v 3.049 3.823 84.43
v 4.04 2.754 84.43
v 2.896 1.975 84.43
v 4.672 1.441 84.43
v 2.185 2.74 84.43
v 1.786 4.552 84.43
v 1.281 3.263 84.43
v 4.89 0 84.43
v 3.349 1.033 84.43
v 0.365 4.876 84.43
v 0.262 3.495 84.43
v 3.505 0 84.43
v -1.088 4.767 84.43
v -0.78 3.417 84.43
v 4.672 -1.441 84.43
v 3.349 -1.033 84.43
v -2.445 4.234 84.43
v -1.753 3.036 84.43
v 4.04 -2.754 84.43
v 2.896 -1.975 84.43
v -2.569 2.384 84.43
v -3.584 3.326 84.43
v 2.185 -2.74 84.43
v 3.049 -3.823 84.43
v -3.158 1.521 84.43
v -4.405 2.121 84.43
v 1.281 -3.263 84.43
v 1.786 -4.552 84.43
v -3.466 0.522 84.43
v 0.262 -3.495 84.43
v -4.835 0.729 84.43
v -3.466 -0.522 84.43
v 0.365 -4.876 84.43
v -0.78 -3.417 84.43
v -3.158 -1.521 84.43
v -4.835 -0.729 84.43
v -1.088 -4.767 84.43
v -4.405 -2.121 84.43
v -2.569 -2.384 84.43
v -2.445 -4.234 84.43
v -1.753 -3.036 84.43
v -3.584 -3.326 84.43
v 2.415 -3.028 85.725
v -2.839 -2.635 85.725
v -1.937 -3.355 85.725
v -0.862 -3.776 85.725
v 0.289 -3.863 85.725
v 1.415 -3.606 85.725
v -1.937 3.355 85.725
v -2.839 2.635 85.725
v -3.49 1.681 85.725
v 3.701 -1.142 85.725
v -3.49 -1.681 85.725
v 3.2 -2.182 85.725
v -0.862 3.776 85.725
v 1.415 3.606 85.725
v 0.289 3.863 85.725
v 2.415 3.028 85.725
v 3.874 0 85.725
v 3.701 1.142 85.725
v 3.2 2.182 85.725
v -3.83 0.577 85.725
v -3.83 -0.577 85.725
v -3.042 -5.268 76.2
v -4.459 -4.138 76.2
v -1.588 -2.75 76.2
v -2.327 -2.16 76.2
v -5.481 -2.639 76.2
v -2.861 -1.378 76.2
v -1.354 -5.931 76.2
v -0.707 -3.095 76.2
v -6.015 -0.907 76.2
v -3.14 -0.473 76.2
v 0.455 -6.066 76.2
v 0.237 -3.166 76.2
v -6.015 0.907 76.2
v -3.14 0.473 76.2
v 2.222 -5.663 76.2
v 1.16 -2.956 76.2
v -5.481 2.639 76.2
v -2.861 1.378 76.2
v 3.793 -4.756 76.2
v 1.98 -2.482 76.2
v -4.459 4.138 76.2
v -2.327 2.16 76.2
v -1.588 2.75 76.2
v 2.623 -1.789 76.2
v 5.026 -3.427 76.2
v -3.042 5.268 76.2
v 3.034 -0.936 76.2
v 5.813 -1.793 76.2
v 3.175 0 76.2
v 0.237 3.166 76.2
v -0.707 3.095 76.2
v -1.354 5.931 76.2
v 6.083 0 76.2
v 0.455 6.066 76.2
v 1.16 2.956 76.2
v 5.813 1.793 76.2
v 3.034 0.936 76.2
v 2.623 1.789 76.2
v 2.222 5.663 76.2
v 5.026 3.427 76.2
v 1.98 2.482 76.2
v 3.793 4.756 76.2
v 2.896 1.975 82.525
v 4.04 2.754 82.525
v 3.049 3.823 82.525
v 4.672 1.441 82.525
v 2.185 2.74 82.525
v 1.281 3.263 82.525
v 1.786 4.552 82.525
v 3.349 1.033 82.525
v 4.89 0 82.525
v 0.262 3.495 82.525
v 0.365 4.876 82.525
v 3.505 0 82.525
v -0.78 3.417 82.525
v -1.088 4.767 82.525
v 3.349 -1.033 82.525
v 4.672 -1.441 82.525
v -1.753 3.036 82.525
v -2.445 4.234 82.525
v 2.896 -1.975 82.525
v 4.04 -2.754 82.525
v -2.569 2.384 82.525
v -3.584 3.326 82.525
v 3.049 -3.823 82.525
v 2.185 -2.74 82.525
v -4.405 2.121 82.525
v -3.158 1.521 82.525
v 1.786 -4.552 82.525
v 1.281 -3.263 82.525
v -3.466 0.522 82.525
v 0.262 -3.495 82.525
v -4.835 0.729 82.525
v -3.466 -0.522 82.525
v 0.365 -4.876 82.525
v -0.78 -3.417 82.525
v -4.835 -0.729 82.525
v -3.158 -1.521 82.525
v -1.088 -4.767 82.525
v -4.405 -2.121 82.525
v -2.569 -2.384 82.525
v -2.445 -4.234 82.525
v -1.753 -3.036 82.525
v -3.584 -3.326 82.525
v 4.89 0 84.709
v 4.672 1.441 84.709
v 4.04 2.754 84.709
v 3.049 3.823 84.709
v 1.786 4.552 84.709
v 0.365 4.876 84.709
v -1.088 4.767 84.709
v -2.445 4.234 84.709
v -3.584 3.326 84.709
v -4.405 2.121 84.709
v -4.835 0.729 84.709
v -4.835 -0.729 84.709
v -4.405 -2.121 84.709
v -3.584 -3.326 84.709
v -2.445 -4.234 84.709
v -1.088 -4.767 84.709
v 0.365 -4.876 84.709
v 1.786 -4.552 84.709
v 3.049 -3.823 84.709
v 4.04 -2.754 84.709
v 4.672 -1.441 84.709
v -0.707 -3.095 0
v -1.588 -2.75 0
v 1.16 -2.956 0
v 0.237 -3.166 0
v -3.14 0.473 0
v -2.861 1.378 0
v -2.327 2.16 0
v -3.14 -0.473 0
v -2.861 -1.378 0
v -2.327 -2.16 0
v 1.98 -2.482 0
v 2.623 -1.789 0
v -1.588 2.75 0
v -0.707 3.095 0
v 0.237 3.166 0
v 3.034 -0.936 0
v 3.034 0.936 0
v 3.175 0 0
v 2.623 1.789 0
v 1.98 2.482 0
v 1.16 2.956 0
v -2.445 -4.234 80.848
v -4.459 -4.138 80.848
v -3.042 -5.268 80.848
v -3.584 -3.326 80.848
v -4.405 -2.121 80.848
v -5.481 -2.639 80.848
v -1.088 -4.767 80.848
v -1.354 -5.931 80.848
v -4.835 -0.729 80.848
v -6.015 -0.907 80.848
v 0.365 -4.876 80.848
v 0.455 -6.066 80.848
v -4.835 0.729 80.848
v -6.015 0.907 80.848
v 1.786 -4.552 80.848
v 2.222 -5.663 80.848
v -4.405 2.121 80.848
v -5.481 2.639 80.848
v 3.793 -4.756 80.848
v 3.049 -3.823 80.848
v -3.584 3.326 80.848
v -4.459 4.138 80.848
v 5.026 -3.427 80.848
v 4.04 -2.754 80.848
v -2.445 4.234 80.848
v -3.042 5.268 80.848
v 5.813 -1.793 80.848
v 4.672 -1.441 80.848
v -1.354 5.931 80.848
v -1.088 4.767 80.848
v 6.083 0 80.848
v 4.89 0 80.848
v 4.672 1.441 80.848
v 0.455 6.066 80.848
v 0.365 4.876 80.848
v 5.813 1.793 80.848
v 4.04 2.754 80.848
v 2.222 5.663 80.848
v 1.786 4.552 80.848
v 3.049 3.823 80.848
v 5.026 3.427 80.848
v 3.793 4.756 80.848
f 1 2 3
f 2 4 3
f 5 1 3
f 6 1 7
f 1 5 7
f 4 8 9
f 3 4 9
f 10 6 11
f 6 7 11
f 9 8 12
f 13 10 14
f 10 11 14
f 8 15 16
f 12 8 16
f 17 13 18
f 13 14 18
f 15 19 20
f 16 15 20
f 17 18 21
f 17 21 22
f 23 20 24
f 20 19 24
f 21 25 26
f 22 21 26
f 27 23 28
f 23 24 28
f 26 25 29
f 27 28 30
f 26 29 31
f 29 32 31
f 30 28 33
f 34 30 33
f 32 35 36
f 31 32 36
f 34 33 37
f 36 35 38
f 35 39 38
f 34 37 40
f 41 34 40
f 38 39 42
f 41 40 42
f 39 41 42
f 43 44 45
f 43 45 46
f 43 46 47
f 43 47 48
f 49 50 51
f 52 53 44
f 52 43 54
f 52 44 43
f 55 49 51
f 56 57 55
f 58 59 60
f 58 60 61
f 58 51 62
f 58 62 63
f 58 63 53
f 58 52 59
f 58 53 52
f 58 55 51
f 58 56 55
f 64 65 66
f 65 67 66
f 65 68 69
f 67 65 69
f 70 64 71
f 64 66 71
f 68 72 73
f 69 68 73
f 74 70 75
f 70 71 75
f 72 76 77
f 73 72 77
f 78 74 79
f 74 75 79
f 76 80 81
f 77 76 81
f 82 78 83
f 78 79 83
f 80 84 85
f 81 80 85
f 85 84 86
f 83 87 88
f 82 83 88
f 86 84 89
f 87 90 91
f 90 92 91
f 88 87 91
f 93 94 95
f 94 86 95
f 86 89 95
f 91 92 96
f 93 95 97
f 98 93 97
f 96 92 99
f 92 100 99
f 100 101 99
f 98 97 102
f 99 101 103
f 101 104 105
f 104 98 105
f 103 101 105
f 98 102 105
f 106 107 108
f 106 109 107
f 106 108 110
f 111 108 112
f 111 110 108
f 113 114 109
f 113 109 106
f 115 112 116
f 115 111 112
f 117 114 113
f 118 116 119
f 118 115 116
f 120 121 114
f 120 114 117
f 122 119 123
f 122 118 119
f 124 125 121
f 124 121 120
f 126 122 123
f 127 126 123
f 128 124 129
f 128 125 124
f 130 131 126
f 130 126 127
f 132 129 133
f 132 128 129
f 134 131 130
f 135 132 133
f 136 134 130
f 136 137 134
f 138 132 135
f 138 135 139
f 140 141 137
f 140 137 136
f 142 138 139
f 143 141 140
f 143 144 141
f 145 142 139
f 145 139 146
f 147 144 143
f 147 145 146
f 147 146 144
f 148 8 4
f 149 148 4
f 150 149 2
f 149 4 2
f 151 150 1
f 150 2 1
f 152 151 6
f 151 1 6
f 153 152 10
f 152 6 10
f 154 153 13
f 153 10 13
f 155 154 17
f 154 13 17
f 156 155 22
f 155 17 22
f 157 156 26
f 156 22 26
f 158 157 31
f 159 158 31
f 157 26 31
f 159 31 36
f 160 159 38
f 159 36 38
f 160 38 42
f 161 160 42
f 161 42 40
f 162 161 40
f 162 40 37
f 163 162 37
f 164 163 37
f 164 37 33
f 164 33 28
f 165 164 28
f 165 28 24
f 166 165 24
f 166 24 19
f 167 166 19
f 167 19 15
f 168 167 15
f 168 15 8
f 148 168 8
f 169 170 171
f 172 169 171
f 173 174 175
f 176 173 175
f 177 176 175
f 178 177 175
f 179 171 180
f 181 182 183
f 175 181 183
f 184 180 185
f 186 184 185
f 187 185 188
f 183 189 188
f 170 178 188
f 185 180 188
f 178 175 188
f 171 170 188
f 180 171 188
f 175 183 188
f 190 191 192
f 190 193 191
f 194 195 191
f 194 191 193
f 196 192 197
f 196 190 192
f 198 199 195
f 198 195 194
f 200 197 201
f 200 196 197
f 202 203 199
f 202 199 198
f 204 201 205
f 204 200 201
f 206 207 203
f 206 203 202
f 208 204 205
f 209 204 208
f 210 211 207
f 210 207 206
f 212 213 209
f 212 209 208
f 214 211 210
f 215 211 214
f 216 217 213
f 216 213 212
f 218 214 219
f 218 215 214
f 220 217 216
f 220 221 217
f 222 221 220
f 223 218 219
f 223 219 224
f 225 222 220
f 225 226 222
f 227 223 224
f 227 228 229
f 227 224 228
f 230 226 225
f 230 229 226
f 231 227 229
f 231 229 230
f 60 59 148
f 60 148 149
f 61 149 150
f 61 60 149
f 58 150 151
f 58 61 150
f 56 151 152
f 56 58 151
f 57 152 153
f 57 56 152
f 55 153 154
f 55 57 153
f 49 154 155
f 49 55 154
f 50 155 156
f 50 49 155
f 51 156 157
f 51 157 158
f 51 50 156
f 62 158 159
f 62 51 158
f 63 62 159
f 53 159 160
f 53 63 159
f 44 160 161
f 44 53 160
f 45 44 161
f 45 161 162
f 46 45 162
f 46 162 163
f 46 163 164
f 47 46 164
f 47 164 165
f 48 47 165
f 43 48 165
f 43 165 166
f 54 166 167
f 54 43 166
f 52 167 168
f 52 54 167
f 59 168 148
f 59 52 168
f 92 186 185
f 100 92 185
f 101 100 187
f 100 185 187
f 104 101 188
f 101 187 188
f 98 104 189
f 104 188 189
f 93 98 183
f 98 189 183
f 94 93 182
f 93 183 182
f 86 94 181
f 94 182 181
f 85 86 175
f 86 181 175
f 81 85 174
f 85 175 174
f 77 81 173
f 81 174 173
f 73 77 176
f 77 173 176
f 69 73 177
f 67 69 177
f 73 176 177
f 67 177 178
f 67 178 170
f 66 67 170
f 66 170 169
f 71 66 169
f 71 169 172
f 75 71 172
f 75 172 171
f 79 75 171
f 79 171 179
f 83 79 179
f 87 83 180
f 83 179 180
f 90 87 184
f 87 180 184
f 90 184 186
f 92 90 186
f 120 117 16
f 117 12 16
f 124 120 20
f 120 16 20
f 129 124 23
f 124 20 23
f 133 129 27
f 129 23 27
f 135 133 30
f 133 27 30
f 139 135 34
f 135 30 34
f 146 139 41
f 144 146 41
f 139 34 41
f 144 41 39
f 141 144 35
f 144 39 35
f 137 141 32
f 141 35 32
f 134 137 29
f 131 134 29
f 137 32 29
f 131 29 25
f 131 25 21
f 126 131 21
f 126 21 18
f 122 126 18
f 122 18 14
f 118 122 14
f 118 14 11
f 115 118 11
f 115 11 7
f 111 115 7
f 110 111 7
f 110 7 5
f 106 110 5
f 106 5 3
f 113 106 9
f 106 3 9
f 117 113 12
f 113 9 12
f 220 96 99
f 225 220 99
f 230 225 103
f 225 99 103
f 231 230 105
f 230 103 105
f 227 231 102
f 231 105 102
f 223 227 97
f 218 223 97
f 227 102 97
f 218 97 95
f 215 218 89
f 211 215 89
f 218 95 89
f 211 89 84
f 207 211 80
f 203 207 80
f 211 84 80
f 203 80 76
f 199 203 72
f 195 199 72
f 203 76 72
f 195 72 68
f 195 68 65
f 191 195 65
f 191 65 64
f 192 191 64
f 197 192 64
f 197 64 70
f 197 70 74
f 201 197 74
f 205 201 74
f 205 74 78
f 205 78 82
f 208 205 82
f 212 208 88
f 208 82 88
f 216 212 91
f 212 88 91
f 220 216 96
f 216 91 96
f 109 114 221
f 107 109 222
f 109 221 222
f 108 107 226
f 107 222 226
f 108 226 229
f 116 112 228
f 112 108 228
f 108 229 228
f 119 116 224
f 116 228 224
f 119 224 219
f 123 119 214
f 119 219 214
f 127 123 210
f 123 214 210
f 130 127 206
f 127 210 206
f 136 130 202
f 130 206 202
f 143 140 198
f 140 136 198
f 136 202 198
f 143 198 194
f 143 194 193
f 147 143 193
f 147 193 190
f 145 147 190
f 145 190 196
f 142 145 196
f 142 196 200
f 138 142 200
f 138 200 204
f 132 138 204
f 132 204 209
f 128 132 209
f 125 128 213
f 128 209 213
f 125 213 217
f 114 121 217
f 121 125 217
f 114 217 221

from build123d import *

# Parameters (mm, degrees)
F0_R     = 3.175
F1_DEPTH = 76.2
F2_R     = 6.0833
F3_DEPTH = 4.6482
F4_R     = 4.8895
F5_DEPTH = 4.8768
F6_W     = 1.3843
F6_H     = 1.905
F8_SIZE  = 1.016


with BuildPart() as f1:
    # F0 (on Top) → F1 (new body)
    with BuildSketch(Plane.XY):
        Circle(F0_R)
    extrude(amount=F1_DEPTH)

    # F2 (on face) → F3 (join)
    with BuildSketch(Plane.XY.offset(76.2)):
        Circle(F2_R)
    extrude(amount=F3_DEPTH)

    # F4 (on face) → F5 (join)
    with BuildSketch(Plane.XY.offset(80.8482)):
        Circle(F4_R)
    extrude(amount=F5_DEPTH)

    # F6 (on Front) → F7 (revolve, cut)
    with BuildSketch(Plane.XZ):
        with Locations((4.19735, 83.4771)):
            Rectangle(F6_W, F6_H)
    revolve(axis=Axis((0, 0, 63.428978), (0, 0, -1)), mode=Mode.SUBTRACT)

    # F8
    f8_edges = [f1.edges().sort_by_distance(p)[0] for p in [
        (-4.8895, 0, 85.725),
    ]]
    chamfer(f8_edges, length=F8_SIZE)


solid = f1.part
